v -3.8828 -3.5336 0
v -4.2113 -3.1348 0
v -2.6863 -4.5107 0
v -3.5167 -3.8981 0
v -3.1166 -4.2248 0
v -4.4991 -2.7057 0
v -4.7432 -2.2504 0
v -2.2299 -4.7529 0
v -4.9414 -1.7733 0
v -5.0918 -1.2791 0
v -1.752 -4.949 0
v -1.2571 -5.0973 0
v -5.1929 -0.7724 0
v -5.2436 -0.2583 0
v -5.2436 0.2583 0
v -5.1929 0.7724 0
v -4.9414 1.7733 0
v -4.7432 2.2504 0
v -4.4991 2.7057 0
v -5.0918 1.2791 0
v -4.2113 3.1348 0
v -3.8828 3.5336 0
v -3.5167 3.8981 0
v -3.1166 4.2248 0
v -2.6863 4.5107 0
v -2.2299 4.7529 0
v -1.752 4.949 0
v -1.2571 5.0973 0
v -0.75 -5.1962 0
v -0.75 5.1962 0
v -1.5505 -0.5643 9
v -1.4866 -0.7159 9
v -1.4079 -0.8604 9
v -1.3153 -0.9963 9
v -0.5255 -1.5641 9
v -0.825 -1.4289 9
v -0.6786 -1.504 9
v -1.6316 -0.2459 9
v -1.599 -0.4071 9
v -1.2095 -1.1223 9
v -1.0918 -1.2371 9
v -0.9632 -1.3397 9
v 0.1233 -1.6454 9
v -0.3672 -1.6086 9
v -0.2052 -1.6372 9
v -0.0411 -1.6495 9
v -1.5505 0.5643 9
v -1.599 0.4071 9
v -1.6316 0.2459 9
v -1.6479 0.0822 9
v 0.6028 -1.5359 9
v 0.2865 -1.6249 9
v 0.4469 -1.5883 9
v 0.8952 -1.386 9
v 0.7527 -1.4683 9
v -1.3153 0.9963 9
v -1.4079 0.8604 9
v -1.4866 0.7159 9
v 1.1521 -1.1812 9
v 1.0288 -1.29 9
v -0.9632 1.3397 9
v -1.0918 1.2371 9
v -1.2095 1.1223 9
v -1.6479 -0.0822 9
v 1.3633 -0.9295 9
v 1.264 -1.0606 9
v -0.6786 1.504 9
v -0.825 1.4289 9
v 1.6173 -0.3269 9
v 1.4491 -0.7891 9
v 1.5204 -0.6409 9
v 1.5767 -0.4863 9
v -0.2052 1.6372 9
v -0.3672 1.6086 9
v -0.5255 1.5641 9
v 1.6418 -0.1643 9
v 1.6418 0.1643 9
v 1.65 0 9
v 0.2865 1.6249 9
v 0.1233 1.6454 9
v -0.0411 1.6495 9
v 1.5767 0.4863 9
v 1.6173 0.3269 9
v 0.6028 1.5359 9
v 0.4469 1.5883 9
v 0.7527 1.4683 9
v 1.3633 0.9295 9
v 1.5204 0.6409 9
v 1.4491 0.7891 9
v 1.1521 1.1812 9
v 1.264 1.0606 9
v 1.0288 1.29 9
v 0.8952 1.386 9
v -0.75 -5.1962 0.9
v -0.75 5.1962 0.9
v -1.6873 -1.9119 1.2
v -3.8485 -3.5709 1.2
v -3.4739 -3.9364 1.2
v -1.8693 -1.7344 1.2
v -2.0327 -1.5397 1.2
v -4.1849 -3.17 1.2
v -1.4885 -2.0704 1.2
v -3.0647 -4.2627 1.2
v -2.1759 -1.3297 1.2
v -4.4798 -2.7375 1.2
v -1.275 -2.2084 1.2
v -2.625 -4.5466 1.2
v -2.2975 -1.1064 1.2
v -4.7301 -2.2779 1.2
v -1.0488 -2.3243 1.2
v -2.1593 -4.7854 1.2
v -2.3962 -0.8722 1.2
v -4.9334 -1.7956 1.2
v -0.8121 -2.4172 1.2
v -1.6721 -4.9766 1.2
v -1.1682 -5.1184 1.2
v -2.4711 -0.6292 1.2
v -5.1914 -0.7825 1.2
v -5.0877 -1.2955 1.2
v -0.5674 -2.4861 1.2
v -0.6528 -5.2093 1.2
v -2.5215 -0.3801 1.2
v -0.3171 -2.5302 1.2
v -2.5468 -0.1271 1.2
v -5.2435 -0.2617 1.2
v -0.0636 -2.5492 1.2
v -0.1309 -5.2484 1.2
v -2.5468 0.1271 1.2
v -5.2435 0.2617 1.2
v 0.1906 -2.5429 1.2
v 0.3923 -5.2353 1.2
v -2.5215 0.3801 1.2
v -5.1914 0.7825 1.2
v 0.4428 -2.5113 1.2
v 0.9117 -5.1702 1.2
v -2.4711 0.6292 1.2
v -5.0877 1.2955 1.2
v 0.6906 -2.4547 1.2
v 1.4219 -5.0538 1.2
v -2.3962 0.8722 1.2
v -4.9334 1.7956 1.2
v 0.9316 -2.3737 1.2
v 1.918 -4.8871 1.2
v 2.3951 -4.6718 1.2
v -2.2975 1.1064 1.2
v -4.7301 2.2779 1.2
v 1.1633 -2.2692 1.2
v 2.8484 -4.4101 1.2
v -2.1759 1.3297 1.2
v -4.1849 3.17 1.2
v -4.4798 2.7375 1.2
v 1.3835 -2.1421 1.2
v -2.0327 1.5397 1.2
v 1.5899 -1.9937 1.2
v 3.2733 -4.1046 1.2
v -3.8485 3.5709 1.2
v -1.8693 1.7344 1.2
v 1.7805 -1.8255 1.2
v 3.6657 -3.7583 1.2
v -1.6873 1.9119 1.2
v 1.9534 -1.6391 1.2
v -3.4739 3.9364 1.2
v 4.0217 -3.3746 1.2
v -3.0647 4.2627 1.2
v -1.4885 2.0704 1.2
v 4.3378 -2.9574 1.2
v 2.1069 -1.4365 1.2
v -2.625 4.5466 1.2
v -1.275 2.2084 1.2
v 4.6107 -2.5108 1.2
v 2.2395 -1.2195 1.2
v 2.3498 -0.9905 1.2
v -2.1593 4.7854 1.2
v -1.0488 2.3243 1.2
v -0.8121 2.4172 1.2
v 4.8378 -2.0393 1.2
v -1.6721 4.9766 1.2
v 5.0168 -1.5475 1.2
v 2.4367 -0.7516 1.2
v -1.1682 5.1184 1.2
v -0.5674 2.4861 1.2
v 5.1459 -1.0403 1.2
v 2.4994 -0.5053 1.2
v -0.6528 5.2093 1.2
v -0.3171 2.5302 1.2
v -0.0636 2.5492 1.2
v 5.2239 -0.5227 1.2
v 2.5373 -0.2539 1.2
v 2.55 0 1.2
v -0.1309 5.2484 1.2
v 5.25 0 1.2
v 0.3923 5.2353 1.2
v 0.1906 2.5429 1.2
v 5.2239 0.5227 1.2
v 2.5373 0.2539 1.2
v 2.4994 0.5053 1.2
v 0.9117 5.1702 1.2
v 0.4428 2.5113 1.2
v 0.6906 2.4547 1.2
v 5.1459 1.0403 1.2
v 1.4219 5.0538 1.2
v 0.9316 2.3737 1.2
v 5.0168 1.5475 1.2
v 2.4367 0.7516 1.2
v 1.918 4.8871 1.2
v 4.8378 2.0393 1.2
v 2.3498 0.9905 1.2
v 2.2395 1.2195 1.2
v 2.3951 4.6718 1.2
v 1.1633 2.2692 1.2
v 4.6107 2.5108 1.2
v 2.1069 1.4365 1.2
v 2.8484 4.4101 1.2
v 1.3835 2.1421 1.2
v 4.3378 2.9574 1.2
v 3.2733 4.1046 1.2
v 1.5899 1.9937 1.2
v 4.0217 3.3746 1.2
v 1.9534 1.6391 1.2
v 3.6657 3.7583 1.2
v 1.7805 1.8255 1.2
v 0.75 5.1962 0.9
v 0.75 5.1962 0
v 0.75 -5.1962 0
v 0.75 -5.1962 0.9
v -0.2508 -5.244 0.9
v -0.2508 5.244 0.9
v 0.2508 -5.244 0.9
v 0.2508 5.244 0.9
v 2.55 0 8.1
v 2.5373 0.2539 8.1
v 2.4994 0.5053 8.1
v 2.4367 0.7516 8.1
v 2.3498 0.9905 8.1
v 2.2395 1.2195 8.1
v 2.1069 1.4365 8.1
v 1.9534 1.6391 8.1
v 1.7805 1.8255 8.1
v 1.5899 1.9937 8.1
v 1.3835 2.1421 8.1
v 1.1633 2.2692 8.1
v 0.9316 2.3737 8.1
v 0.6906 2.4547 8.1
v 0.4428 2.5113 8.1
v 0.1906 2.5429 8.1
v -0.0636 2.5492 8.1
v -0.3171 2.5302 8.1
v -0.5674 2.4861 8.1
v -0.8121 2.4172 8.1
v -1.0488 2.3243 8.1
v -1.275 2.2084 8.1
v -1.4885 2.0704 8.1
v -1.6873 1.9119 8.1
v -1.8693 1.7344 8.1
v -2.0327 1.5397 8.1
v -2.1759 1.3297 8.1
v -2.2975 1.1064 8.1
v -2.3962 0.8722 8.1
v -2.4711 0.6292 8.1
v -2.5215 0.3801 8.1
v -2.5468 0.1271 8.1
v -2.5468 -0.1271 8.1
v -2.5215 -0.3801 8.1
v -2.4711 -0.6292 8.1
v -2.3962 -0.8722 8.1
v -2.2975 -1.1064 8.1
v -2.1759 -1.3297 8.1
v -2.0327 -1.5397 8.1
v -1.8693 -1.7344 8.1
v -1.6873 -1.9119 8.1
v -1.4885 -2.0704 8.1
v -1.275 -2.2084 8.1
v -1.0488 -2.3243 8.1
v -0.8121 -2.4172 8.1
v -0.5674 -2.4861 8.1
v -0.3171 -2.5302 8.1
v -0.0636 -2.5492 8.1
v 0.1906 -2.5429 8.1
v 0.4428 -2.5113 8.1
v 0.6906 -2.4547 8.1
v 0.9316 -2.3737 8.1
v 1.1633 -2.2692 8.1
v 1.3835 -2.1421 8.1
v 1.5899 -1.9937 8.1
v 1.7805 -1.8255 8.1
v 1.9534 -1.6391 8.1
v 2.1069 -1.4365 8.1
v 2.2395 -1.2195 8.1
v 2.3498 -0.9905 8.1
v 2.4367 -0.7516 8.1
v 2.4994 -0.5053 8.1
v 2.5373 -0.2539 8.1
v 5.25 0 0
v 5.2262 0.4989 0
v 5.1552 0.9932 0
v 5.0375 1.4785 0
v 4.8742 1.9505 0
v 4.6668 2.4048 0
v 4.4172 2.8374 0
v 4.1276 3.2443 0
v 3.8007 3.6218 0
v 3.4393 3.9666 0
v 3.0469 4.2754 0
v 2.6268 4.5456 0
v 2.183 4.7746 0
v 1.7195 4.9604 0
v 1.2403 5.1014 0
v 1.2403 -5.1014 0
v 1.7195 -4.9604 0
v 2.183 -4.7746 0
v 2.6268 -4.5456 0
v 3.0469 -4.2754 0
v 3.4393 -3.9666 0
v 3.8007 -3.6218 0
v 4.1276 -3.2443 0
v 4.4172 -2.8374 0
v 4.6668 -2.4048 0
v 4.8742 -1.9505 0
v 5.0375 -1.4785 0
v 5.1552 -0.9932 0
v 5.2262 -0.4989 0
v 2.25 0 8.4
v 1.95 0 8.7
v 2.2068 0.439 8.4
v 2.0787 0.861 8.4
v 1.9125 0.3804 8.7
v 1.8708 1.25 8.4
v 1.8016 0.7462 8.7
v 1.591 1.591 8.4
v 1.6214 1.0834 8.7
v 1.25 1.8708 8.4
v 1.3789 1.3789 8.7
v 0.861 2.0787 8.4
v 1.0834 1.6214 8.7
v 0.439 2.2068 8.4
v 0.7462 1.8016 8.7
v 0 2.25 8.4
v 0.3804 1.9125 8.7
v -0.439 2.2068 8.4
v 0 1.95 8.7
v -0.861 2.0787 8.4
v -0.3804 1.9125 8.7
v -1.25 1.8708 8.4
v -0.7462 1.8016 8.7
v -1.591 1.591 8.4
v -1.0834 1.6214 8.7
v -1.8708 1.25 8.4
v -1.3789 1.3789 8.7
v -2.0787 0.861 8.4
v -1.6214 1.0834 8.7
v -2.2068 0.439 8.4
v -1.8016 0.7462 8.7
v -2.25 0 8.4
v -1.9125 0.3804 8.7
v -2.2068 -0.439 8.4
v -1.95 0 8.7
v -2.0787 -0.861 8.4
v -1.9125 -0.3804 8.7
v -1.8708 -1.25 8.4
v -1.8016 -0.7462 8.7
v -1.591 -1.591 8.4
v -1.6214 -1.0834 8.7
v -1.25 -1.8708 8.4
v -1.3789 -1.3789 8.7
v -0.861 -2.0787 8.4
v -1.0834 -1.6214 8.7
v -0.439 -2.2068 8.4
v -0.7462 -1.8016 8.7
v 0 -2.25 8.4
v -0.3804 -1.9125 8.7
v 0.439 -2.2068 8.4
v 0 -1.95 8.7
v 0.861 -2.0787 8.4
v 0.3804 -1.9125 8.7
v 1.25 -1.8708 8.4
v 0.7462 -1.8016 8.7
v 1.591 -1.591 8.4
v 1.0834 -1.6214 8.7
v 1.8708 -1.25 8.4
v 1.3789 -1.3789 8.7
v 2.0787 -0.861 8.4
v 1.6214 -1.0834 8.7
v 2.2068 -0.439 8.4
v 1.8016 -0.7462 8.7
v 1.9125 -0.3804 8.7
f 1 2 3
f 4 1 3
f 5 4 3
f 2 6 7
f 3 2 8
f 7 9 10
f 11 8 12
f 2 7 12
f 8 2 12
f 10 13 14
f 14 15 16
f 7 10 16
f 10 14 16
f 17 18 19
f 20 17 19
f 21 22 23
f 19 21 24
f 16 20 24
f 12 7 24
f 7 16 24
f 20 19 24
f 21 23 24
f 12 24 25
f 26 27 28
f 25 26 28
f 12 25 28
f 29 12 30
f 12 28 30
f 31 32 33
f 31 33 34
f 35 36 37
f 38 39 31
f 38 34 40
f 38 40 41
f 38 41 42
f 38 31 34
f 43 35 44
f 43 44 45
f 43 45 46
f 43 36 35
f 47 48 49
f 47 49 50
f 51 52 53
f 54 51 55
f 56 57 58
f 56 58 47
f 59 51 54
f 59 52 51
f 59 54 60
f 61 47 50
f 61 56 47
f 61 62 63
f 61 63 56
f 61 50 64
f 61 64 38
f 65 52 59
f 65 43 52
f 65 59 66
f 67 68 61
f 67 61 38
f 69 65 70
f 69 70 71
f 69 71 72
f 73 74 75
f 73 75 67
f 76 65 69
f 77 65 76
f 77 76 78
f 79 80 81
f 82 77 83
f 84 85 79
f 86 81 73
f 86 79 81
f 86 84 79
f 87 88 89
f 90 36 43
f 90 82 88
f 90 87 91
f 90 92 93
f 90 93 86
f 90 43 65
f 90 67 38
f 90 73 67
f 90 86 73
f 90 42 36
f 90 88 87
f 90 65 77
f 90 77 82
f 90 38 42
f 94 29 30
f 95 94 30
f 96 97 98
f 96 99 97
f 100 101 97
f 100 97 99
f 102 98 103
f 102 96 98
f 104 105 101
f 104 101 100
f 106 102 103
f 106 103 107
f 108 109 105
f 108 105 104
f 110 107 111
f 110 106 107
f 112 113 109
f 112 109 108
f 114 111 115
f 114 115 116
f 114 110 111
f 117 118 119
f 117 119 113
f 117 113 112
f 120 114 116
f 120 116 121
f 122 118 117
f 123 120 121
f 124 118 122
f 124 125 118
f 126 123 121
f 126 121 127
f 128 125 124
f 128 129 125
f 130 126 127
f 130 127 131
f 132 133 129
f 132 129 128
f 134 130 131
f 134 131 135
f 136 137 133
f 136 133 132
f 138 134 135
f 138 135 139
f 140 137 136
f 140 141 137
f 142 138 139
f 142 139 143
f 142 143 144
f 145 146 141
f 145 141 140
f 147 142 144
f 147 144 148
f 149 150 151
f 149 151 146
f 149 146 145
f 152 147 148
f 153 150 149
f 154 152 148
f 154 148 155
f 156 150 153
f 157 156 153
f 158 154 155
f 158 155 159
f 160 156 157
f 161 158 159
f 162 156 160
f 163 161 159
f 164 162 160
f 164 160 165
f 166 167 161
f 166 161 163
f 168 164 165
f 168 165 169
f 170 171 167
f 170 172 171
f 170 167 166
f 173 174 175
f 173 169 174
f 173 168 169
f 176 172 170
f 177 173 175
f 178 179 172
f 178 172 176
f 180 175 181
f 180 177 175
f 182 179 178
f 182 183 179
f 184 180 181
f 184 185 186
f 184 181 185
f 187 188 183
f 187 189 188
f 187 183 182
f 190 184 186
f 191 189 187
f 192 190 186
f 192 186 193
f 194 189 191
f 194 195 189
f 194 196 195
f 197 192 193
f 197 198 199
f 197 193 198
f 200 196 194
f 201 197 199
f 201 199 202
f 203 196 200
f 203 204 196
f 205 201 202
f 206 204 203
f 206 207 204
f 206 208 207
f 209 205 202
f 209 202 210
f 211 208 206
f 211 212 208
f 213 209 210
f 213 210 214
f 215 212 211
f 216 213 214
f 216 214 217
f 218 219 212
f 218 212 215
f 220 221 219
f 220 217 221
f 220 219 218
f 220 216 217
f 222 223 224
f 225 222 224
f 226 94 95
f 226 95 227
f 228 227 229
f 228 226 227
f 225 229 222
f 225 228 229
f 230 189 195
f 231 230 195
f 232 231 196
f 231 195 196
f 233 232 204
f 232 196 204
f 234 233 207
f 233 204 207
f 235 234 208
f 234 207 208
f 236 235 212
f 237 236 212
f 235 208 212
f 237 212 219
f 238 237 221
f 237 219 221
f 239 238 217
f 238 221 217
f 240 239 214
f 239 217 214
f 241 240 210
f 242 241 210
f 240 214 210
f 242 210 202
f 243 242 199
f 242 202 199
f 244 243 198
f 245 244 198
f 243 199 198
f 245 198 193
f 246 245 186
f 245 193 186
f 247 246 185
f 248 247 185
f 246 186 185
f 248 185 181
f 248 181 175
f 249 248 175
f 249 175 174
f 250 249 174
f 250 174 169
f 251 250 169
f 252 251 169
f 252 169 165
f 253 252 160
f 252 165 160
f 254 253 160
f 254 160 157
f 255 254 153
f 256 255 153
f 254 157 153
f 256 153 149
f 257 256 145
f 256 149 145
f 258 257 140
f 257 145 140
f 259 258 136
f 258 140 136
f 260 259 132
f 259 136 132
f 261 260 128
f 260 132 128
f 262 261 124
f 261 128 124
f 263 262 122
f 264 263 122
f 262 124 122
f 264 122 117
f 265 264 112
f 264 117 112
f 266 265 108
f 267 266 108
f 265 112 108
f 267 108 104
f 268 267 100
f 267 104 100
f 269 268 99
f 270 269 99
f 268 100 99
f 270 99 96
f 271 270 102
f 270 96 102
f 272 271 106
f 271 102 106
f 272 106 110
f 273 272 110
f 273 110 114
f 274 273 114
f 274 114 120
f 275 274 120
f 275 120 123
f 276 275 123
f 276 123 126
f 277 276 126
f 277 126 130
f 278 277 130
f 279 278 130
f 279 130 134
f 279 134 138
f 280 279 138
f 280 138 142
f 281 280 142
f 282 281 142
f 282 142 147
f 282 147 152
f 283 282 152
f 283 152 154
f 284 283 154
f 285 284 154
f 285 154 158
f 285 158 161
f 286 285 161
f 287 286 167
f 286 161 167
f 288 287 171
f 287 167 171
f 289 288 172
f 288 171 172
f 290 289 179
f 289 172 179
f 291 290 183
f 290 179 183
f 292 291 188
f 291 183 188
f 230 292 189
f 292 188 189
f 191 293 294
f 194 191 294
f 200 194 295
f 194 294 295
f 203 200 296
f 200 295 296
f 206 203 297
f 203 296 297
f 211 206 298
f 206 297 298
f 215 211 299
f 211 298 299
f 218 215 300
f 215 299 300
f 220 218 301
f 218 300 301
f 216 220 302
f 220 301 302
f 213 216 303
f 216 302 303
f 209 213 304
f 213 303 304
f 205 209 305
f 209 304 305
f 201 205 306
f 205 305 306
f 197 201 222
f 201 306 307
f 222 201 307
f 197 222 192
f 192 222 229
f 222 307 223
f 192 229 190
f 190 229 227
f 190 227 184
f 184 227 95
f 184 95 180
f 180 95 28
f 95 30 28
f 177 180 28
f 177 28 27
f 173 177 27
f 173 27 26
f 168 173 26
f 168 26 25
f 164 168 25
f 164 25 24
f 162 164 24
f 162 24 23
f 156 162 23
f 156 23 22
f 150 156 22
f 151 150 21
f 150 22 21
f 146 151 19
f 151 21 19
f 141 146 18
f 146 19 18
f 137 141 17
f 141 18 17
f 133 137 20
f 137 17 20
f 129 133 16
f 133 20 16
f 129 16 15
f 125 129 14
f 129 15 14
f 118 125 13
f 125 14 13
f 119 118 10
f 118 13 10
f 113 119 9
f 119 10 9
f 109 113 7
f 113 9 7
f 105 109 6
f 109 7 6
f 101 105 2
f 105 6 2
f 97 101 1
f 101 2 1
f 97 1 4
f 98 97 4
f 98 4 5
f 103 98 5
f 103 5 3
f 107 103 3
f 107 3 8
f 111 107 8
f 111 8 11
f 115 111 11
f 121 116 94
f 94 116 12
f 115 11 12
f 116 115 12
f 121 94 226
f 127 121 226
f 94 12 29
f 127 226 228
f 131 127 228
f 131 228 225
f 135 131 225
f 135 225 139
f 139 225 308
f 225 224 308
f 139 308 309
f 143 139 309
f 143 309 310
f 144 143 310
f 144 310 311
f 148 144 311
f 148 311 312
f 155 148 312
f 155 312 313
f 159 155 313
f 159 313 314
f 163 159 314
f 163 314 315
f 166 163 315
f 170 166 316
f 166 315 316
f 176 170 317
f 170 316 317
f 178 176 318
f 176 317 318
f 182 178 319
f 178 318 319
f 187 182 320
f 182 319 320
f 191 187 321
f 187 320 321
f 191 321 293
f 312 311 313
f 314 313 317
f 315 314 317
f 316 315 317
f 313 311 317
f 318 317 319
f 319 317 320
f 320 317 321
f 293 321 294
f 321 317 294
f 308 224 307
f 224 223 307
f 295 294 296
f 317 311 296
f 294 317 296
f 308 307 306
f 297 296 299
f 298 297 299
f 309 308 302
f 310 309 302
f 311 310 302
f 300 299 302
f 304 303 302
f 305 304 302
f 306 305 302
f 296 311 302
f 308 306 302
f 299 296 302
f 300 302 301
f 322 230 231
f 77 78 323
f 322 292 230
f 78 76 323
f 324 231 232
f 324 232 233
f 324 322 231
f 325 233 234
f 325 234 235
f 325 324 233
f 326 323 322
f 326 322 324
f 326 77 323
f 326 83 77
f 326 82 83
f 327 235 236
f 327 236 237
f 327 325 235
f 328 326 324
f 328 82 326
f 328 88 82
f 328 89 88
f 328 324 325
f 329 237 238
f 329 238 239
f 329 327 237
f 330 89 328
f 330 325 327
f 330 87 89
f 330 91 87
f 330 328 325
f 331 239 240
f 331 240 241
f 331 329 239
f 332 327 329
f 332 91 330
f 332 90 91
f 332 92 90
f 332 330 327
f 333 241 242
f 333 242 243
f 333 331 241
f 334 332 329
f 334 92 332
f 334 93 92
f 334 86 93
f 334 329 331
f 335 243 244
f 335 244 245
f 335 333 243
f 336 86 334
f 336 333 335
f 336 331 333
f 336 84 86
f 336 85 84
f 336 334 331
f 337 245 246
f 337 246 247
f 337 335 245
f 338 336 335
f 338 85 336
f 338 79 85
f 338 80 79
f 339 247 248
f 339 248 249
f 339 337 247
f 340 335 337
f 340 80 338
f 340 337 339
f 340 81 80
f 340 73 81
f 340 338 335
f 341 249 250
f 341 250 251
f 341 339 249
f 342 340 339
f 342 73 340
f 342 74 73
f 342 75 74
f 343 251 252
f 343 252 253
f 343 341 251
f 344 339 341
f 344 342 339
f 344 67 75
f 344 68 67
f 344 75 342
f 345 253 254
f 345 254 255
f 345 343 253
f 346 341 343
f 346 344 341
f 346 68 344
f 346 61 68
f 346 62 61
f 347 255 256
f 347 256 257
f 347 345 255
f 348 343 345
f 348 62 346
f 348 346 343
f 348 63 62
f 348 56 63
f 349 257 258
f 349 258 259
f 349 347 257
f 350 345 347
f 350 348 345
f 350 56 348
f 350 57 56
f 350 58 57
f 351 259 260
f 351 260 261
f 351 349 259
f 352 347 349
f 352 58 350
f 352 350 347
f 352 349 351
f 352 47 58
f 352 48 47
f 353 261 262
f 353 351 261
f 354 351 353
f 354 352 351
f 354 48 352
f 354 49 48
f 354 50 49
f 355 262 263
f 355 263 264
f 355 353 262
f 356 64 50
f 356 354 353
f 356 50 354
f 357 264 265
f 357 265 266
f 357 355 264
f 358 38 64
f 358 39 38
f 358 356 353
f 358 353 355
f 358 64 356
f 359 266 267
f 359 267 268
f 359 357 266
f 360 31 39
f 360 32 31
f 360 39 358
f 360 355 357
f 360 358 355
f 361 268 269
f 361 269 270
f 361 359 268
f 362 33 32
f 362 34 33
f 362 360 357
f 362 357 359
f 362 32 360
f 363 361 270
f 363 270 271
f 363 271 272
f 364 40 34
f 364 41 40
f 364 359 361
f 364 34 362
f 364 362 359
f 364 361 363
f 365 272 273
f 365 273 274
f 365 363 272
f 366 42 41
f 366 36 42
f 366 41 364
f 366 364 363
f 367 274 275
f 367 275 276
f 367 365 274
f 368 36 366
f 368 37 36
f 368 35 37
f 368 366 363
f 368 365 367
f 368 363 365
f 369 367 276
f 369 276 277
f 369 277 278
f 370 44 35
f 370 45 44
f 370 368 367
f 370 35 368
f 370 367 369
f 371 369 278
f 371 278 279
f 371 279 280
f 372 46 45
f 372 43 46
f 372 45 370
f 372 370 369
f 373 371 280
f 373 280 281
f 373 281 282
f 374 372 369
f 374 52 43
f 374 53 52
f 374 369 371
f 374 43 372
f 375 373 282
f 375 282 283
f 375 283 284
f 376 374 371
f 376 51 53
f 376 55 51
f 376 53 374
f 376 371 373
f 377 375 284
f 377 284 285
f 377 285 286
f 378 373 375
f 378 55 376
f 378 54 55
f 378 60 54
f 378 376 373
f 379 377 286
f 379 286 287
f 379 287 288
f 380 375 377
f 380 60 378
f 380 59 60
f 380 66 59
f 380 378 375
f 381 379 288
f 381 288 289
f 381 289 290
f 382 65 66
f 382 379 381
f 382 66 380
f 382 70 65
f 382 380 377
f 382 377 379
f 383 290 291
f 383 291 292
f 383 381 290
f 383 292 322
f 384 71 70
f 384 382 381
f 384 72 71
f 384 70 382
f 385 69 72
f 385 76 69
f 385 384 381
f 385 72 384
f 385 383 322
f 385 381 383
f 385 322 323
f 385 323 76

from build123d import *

# Parameters (mm, degrees)
F0_R     = 1.75
F1_DEPTH = 0.4
F2_R     = 0.85
F3_DEPTH = 2.6
F5_DEPTH = 0.3
F6_SIZE2 = 0.3
F6_SIZE  = 0.3
F7_SCALE = 3


with BuildPart() as f1:
    # F0 (on Top) → F1 (new body)
    with BuildSketch(Plane.XY):
        Circle(F0_R)
    extrude(amount=F1_DEPTH)

    # F2 (on face) → F3 (join)
    with BuildSketch(Plane.XY.offset(0.4)):
        Circle(F2_R)
    extrude(amount=F3_DEPTH)

    # F4 (on face) → F5 (cut)
    with BuildSketch(Plane(origin=(0, 0, 0), x_dir=(1, 0, 0), z_dir=(0, 0, -1))):
        with BuildLine():
            ThreePointArc((0.25, 1.7320508076), (0, 1.75), (-0.25, 1.7320508076))
            Line((-0.25, 1.7320508076), (-0.25, -1.7320508076))
            ThreePointArc((-0.25, -1.7320508076), (0, -1.75), (0.25, -1.7320508076))
            Line((0.25, -1.7320508076), (0.25, 1.7320508076))
        make_face()
    extrude(amount=-F5_DEPTH, mode=Mode.SUBTRACT)

    # F6
    f6_edges = [f1.edges().sort_by_distance(p)[0] for p in [
        (-0.85, 0, 3),
    ]]
    chamfer(f6_edges, length=F6_SIZE, length2=F6_SIZE2)


with BuildPart() as f1_1:
    # F7: moved
    add(f1.part.scale(F7_SCALE))


solid = f1_1.part
